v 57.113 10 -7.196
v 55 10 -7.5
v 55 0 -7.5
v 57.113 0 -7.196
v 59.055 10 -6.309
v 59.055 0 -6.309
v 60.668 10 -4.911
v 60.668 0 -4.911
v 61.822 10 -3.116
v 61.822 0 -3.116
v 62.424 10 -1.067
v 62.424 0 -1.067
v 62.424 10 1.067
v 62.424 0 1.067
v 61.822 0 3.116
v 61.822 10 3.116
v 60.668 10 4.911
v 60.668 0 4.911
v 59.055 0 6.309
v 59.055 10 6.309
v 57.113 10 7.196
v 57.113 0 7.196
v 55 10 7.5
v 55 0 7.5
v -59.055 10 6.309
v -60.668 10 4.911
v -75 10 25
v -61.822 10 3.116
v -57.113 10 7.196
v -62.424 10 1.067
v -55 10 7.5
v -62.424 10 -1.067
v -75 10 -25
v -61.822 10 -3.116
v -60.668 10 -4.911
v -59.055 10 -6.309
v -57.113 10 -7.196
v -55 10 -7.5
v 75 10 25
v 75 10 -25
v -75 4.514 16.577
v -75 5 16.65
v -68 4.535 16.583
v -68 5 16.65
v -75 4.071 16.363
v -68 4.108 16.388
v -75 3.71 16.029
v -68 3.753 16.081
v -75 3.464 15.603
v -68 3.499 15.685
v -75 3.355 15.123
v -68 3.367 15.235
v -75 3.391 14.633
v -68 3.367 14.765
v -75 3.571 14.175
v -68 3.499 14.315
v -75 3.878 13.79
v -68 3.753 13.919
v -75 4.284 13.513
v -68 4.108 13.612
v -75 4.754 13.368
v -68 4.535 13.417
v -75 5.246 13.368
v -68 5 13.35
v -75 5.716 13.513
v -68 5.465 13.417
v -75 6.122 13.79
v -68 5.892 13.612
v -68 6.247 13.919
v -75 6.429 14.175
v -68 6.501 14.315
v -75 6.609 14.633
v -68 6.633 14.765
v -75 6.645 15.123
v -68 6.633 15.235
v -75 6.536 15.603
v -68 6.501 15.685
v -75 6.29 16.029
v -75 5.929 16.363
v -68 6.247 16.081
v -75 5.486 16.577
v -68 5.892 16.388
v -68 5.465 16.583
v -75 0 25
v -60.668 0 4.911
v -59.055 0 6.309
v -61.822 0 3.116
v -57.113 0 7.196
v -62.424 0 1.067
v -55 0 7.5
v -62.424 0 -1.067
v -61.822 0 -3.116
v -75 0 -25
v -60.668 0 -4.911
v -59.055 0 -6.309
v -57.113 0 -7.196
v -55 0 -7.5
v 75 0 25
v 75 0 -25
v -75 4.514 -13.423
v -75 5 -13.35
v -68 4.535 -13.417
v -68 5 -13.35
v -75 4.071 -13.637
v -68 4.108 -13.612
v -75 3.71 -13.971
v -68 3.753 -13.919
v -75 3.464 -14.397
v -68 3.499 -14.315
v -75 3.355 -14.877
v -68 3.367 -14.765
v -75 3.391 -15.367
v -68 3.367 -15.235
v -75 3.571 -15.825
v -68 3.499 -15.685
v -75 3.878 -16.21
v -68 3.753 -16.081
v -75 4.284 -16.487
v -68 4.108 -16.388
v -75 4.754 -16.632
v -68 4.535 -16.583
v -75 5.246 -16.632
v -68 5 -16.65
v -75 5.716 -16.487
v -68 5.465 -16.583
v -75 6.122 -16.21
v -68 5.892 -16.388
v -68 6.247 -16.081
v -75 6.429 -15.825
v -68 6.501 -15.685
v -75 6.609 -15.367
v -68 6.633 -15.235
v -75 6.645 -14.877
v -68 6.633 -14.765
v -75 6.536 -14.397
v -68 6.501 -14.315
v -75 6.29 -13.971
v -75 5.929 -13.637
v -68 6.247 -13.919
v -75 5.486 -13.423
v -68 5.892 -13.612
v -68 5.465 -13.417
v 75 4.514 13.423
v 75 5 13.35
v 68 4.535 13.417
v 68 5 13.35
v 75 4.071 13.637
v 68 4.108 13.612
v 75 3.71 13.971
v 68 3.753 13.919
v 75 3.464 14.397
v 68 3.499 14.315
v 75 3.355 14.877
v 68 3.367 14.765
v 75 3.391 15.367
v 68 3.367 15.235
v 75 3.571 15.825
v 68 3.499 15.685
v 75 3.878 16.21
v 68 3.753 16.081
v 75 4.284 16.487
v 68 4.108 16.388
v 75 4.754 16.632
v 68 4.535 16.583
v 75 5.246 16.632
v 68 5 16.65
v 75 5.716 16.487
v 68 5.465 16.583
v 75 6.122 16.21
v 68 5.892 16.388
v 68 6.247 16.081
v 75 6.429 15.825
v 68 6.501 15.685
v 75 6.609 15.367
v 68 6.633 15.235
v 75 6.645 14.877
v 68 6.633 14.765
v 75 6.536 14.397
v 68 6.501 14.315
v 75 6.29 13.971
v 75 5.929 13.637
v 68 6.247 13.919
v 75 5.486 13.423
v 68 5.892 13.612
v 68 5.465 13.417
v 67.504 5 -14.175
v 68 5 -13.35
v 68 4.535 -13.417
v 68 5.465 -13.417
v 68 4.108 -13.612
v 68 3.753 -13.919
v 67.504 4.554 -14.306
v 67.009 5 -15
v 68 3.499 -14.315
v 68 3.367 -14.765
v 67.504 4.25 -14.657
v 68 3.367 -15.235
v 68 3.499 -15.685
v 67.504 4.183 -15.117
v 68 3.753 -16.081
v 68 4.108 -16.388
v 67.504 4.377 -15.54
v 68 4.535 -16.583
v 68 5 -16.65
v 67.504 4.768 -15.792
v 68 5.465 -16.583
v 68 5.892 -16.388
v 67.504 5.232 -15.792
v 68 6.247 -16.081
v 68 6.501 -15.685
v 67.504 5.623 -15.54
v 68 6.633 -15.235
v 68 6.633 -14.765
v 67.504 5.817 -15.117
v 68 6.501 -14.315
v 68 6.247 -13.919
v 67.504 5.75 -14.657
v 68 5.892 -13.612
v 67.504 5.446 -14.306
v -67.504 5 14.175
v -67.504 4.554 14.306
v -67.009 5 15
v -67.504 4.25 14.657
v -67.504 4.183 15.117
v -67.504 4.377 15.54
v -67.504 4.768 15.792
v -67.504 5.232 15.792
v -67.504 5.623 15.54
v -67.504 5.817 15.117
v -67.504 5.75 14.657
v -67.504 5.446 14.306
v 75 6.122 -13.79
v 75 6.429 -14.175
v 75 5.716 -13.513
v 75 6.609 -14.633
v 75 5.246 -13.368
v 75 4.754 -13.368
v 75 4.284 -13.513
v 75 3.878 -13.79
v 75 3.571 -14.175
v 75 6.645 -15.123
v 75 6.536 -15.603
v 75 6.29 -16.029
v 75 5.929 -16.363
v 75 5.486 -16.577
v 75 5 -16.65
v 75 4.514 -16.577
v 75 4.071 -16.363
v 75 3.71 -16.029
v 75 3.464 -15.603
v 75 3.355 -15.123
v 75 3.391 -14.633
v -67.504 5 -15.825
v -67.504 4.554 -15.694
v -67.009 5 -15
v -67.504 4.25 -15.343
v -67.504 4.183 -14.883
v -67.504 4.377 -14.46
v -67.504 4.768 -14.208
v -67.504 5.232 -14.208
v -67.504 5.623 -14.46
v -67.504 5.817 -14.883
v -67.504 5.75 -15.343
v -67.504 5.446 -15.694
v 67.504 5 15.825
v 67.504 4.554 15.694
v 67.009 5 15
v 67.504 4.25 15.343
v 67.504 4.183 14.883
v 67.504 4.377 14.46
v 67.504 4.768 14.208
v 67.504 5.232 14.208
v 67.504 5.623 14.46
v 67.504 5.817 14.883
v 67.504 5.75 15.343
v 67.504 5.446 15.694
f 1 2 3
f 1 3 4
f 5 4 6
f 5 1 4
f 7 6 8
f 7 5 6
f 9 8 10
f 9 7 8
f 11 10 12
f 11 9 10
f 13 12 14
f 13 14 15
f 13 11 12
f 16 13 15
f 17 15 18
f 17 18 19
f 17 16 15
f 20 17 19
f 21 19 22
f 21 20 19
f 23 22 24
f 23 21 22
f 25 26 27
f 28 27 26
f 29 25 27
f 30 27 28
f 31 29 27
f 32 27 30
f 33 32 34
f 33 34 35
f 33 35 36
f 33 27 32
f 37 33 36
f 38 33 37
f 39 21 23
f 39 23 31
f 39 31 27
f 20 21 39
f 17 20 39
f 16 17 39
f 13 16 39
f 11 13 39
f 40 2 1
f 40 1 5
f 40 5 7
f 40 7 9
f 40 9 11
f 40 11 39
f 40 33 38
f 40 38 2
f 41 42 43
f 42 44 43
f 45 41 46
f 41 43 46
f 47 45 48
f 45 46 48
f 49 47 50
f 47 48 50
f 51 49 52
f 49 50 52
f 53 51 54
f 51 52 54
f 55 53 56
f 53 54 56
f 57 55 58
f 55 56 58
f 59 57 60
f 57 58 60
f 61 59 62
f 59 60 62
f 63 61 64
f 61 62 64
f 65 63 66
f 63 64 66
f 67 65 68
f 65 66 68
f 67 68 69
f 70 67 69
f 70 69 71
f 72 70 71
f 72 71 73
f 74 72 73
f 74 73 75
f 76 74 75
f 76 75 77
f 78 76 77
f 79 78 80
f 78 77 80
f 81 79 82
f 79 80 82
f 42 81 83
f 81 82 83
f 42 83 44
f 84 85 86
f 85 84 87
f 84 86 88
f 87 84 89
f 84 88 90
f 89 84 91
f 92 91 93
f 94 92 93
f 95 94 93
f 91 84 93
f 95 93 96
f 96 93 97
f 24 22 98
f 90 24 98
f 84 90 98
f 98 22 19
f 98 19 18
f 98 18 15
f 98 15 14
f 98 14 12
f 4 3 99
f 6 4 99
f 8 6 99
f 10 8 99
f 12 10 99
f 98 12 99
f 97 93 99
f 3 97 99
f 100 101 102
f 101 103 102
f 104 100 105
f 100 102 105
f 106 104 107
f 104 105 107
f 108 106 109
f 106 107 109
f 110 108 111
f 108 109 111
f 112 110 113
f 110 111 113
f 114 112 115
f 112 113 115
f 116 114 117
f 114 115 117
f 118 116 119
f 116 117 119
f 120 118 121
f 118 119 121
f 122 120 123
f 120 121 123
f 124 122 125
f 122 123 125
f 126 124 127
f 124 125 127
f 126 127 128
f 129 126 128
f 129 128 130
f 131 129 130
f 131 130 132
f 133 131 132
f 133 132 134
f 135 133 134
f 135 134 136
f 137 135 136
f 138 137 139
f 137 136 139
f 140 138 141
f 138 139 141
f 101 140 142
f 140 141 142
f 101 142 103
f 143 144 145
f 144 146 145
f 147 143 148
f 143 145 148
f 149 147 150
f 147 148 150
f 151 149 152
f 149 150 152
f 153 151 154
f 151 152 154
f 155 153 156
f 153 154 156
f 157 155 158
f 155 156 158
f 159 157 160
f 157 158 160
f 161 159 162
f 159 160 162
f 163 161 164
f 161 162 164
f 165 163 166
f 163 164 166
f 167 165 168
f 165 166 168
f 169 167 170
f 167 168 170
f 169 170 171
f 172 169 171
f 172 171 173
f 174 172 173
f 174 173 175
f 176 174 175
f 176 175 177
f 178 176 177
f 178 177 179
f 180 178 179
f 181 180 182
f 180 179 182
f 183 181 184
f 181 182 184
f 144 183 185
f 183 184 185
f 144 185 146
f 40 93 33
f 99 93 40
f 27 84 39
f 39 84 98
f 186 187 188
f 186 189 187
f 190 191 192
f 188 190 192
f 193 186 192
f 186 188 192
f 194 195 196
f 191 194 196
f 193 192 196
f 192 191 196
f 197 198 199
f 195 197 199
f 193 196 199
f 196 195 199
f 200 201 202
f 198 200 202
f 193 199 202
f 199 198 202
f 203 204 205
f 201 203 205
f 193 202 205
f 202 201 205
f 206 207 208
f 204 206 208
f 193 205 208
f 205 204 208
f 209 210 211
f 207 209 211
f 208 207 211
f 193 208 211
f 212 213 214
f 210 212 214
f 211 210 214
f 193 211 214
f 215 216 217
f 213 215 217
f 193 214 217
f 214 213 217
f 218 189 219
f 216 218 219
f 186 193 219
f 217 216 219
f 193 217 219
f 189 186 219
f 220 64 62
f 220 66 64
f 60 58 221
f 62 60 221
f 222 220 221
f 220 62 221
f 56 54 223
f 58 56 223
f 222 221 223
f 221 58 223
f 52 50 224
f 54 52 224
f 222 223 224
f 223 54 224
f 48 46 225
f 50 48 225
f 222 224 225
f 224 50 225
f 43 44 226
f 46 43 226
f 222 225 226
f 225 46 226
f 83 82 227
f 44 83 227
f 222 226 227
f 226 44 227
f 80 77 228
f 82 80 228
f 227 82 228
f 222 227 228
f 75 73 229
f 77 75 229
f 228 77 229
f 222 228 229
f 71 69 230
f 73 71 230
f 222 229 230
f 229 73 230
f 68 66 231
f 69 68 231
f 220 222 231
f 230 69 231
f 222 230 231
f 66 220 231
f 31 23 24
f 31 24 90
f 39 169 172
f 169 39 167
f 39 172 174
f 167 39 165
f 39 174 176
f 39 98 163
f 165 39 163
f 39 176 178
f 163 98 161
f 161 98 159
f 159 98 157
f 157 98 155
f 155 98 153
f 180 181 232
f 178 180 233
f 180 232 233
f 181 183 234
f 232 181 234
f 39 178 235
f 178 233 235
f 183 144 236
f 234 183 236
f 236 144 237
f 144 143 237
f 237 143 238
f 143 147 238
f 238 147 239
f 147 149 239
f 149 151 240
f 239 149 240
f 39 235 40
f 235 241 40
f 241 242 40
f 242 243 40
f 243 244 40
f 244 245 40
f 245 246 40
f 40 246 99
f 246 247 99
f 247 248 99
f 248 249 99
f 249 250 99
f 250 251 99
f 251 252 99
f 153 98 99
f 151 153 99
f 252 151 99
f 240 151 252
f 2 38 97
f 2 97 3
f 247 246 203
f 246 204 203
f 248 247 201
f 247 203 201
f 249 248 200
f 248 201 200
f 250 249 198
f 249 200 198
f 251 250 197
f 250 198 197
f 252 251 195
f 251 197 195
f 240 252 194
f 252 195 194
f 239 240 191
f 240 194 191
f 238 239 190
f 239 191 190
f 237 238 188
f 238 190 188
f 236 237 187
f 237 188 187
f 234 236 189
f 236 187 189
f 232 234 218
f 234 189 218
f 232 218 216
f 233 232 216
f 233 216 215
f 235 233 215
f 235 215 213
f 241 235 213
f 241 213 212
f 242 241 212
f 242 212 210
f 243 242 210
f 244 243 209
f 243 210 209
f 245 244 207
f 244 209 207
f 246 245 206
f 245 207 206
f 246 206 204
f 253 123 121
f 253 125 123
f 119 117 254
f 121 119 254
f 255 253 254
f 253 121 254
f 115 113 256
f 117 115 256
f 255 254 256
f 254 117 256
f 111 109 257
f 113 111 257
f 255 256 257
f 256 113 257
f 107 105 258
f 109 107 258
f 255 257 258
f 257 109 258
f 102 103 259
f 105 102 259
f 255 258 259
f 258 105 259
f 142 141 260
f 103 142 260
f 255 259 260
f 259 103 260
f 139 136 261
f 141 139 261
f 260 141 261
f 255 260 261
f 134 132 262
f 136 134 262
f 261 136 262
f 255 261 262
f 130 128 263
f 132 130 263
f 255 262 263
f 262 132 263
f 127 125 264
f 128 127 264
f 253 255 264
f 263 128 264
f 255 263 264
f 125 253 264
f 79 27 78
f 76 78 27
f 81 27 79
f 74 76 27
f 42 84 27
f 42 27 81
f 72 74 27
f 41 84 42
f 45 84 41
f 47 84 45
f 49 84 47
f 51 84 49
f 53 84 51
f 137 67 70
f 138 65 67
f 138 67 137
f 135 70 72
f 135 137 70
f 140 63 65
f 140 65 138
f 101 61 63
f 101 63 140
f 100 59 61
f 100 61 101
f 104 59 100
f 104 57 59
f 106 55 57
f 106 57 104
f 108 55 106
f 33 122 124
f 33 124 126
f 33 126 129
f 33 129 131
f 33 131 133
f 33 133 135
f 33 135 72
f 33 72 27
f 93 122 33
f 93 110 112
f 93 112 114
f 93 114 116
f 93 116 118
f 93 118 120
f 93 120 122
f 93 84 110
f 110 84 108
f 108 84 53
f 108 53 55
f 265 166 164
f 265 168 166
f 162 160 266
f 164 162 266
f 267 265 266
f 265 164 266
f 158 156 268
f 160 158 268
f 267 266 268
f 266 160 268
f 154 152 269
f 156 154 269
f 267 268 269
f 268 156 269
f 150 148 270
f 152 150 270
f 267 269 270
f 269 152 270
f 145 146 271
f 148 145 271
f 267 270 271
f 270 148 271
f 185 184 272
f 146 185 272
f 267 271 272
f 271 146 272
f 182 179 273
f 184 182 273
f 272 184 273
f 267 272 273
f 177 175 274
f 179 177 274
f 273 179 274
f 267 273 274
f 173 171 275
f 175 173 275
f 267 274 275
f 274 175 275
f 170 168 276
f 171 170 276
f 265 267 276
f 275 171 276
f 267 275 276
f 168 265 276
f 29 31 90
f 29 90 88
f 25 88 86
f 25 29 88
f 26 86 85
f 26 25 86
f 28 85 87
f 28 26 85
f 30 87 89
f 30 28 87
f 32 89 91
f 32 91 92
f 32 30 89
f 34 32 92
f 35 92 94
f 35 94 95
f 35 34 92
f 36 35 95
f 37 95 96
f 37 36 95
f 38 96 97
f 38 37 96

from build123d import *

# Parameters (mm, degrees)
SKETCH_1_W                       = 150
SKETCH_1_H                       = 50
EXTRUDE_1_DEPTH                  = 10
CUT_EXTRUDE_1_DEPTH              = 10
HOLE_WIZARD_M4_1_D               = 3.3
HOLE_WIZARD_M4_1_DEPTH           = 7
HOLE_WIZARD_M4_1_TIP             = 0.991420021
HOLE_WIZARD_M4_2_D               = 3.3
HOLE_WIZARD_M4_2_DEPTH           = 7
HOLE_WIZARD_M4_2_TIP             = 0.991420021
HOLE_WIZARD_M4_2_ON_FACE_2_D     = 3.3
HOLE_WIZARD_M4_2_ON_FACE_2_DEPTH = 7
HOLE_WIZARD_M4_2_ON_FACE_2_TIP   = 0.991420021


with BuildPart() as part:
    # 草图1 → 凸台-拉伸1 (new body)
    with BuildSketch(Plane(origin=(0, 0, 0), x_dir=(1, 0, 0), z_dir=(0, 1, 0))):
        Rectangle(SKETCH_1_W, SKETCH_1_H)
    extrude(amount=EXTRUDE_1_DEPTH)

    # 草图2 → 切除-拉伸1 (cut)
    with BuildSketch(Plane(origin=(0, 10, 0), x_dir=(1, 0, 0), z_dir=(0, 1, 0))):
        with BuildLine():
            Line((-55, 7.5), (55, 7.5))
            ThreePointArc((55, 7.5), (62.5, 0), (55, -7.5))
            Line((55, -7.5), (-55, -7.5))
            ThreePointArc((-55, -7.5), (-62.5, 0), (-55, 7.5))
        make_face()
    extrude(amount=-CUT_EXTRUDE_1_DEPTH, mode=Mode.SUBTRACT)

    # M4 螺纹孔的螺纹孔钻头1
    with Locations(Plane(origin=(-75, 5, -15), x_dir=(0, 0, -1), z_dir=(-1, 0, 0))):
        with Locations((0, 0), (-30, 0)):
            Hole(HOLE_WIZARD_M4_1_D / 2, depth=HOLE_WIZARD_M4_1_DEPTH)
            with Locations((0, 0, -(HOLE_WIZARD_M4_1_DEPTH + HOLE_WIZARD_M4_1_TIP / 2))):  # 118° drill point
                Cone(0, HOLE_WIZARD_M4_1_D / 2, HOLE_WIZARD_M4_1_TIP, mode=Mode.SUBTRACT)

    # M4 螺纹孔的螺纹孔钻头2
    with Locations(Plane(origin=(75, 5, 15), x_dir=(0, 0, 1), z_dir=(1, 0, 0))):
        with Locations((0, 0), (-30, 0)):
            Hole(HOLE_WIZARD_M4_2_D / 2, depth=HOLE_WIZARD_M4_2_DEPTH)
            with Locations((0, 0, -(HOLE_WIZARD_M4_2_DEPTH + HOLE_WIZARD_M4_2_TIP / 2))):  # 118° drill point
                Cone(0, HOLE_WIZARD_M4_2_D / 2, HOLE_WIZARD_M4_2_TIP, mode=Mode.SUBTRACT)

    # M4 螺纹孔的螺纹孔钻头2 on face 2
    with Locations(Plane(origin=(0, 37.698562119, 89.96356162), x_dir=(0, 0, 1), z_dir=(1, 0, 0))):
        with Locations((0, 0)):
            Hole(HOLE_WIZARD_M4_2_ON_FACE_2_D / 2, depth=HOLE_WIZARD_M4_2_ON_FACE_2_DEPTH)
            with Locations((0, 0, -(HOLE_WIZARD_M4_2_ON_FACE_2_DEPTH + HOLE_WIZARD_M4_2_ON_FACE_2_TIP / 2))):  # 118° drill point
                Cone(0, HOLE_WIZARD_M4_2_ON_FACE_2_D / 2, HOLE_WIZARD_M4_2_ON_FACE_2_TIP, mode=Mode.SUBTRACT)


solid = part.part
